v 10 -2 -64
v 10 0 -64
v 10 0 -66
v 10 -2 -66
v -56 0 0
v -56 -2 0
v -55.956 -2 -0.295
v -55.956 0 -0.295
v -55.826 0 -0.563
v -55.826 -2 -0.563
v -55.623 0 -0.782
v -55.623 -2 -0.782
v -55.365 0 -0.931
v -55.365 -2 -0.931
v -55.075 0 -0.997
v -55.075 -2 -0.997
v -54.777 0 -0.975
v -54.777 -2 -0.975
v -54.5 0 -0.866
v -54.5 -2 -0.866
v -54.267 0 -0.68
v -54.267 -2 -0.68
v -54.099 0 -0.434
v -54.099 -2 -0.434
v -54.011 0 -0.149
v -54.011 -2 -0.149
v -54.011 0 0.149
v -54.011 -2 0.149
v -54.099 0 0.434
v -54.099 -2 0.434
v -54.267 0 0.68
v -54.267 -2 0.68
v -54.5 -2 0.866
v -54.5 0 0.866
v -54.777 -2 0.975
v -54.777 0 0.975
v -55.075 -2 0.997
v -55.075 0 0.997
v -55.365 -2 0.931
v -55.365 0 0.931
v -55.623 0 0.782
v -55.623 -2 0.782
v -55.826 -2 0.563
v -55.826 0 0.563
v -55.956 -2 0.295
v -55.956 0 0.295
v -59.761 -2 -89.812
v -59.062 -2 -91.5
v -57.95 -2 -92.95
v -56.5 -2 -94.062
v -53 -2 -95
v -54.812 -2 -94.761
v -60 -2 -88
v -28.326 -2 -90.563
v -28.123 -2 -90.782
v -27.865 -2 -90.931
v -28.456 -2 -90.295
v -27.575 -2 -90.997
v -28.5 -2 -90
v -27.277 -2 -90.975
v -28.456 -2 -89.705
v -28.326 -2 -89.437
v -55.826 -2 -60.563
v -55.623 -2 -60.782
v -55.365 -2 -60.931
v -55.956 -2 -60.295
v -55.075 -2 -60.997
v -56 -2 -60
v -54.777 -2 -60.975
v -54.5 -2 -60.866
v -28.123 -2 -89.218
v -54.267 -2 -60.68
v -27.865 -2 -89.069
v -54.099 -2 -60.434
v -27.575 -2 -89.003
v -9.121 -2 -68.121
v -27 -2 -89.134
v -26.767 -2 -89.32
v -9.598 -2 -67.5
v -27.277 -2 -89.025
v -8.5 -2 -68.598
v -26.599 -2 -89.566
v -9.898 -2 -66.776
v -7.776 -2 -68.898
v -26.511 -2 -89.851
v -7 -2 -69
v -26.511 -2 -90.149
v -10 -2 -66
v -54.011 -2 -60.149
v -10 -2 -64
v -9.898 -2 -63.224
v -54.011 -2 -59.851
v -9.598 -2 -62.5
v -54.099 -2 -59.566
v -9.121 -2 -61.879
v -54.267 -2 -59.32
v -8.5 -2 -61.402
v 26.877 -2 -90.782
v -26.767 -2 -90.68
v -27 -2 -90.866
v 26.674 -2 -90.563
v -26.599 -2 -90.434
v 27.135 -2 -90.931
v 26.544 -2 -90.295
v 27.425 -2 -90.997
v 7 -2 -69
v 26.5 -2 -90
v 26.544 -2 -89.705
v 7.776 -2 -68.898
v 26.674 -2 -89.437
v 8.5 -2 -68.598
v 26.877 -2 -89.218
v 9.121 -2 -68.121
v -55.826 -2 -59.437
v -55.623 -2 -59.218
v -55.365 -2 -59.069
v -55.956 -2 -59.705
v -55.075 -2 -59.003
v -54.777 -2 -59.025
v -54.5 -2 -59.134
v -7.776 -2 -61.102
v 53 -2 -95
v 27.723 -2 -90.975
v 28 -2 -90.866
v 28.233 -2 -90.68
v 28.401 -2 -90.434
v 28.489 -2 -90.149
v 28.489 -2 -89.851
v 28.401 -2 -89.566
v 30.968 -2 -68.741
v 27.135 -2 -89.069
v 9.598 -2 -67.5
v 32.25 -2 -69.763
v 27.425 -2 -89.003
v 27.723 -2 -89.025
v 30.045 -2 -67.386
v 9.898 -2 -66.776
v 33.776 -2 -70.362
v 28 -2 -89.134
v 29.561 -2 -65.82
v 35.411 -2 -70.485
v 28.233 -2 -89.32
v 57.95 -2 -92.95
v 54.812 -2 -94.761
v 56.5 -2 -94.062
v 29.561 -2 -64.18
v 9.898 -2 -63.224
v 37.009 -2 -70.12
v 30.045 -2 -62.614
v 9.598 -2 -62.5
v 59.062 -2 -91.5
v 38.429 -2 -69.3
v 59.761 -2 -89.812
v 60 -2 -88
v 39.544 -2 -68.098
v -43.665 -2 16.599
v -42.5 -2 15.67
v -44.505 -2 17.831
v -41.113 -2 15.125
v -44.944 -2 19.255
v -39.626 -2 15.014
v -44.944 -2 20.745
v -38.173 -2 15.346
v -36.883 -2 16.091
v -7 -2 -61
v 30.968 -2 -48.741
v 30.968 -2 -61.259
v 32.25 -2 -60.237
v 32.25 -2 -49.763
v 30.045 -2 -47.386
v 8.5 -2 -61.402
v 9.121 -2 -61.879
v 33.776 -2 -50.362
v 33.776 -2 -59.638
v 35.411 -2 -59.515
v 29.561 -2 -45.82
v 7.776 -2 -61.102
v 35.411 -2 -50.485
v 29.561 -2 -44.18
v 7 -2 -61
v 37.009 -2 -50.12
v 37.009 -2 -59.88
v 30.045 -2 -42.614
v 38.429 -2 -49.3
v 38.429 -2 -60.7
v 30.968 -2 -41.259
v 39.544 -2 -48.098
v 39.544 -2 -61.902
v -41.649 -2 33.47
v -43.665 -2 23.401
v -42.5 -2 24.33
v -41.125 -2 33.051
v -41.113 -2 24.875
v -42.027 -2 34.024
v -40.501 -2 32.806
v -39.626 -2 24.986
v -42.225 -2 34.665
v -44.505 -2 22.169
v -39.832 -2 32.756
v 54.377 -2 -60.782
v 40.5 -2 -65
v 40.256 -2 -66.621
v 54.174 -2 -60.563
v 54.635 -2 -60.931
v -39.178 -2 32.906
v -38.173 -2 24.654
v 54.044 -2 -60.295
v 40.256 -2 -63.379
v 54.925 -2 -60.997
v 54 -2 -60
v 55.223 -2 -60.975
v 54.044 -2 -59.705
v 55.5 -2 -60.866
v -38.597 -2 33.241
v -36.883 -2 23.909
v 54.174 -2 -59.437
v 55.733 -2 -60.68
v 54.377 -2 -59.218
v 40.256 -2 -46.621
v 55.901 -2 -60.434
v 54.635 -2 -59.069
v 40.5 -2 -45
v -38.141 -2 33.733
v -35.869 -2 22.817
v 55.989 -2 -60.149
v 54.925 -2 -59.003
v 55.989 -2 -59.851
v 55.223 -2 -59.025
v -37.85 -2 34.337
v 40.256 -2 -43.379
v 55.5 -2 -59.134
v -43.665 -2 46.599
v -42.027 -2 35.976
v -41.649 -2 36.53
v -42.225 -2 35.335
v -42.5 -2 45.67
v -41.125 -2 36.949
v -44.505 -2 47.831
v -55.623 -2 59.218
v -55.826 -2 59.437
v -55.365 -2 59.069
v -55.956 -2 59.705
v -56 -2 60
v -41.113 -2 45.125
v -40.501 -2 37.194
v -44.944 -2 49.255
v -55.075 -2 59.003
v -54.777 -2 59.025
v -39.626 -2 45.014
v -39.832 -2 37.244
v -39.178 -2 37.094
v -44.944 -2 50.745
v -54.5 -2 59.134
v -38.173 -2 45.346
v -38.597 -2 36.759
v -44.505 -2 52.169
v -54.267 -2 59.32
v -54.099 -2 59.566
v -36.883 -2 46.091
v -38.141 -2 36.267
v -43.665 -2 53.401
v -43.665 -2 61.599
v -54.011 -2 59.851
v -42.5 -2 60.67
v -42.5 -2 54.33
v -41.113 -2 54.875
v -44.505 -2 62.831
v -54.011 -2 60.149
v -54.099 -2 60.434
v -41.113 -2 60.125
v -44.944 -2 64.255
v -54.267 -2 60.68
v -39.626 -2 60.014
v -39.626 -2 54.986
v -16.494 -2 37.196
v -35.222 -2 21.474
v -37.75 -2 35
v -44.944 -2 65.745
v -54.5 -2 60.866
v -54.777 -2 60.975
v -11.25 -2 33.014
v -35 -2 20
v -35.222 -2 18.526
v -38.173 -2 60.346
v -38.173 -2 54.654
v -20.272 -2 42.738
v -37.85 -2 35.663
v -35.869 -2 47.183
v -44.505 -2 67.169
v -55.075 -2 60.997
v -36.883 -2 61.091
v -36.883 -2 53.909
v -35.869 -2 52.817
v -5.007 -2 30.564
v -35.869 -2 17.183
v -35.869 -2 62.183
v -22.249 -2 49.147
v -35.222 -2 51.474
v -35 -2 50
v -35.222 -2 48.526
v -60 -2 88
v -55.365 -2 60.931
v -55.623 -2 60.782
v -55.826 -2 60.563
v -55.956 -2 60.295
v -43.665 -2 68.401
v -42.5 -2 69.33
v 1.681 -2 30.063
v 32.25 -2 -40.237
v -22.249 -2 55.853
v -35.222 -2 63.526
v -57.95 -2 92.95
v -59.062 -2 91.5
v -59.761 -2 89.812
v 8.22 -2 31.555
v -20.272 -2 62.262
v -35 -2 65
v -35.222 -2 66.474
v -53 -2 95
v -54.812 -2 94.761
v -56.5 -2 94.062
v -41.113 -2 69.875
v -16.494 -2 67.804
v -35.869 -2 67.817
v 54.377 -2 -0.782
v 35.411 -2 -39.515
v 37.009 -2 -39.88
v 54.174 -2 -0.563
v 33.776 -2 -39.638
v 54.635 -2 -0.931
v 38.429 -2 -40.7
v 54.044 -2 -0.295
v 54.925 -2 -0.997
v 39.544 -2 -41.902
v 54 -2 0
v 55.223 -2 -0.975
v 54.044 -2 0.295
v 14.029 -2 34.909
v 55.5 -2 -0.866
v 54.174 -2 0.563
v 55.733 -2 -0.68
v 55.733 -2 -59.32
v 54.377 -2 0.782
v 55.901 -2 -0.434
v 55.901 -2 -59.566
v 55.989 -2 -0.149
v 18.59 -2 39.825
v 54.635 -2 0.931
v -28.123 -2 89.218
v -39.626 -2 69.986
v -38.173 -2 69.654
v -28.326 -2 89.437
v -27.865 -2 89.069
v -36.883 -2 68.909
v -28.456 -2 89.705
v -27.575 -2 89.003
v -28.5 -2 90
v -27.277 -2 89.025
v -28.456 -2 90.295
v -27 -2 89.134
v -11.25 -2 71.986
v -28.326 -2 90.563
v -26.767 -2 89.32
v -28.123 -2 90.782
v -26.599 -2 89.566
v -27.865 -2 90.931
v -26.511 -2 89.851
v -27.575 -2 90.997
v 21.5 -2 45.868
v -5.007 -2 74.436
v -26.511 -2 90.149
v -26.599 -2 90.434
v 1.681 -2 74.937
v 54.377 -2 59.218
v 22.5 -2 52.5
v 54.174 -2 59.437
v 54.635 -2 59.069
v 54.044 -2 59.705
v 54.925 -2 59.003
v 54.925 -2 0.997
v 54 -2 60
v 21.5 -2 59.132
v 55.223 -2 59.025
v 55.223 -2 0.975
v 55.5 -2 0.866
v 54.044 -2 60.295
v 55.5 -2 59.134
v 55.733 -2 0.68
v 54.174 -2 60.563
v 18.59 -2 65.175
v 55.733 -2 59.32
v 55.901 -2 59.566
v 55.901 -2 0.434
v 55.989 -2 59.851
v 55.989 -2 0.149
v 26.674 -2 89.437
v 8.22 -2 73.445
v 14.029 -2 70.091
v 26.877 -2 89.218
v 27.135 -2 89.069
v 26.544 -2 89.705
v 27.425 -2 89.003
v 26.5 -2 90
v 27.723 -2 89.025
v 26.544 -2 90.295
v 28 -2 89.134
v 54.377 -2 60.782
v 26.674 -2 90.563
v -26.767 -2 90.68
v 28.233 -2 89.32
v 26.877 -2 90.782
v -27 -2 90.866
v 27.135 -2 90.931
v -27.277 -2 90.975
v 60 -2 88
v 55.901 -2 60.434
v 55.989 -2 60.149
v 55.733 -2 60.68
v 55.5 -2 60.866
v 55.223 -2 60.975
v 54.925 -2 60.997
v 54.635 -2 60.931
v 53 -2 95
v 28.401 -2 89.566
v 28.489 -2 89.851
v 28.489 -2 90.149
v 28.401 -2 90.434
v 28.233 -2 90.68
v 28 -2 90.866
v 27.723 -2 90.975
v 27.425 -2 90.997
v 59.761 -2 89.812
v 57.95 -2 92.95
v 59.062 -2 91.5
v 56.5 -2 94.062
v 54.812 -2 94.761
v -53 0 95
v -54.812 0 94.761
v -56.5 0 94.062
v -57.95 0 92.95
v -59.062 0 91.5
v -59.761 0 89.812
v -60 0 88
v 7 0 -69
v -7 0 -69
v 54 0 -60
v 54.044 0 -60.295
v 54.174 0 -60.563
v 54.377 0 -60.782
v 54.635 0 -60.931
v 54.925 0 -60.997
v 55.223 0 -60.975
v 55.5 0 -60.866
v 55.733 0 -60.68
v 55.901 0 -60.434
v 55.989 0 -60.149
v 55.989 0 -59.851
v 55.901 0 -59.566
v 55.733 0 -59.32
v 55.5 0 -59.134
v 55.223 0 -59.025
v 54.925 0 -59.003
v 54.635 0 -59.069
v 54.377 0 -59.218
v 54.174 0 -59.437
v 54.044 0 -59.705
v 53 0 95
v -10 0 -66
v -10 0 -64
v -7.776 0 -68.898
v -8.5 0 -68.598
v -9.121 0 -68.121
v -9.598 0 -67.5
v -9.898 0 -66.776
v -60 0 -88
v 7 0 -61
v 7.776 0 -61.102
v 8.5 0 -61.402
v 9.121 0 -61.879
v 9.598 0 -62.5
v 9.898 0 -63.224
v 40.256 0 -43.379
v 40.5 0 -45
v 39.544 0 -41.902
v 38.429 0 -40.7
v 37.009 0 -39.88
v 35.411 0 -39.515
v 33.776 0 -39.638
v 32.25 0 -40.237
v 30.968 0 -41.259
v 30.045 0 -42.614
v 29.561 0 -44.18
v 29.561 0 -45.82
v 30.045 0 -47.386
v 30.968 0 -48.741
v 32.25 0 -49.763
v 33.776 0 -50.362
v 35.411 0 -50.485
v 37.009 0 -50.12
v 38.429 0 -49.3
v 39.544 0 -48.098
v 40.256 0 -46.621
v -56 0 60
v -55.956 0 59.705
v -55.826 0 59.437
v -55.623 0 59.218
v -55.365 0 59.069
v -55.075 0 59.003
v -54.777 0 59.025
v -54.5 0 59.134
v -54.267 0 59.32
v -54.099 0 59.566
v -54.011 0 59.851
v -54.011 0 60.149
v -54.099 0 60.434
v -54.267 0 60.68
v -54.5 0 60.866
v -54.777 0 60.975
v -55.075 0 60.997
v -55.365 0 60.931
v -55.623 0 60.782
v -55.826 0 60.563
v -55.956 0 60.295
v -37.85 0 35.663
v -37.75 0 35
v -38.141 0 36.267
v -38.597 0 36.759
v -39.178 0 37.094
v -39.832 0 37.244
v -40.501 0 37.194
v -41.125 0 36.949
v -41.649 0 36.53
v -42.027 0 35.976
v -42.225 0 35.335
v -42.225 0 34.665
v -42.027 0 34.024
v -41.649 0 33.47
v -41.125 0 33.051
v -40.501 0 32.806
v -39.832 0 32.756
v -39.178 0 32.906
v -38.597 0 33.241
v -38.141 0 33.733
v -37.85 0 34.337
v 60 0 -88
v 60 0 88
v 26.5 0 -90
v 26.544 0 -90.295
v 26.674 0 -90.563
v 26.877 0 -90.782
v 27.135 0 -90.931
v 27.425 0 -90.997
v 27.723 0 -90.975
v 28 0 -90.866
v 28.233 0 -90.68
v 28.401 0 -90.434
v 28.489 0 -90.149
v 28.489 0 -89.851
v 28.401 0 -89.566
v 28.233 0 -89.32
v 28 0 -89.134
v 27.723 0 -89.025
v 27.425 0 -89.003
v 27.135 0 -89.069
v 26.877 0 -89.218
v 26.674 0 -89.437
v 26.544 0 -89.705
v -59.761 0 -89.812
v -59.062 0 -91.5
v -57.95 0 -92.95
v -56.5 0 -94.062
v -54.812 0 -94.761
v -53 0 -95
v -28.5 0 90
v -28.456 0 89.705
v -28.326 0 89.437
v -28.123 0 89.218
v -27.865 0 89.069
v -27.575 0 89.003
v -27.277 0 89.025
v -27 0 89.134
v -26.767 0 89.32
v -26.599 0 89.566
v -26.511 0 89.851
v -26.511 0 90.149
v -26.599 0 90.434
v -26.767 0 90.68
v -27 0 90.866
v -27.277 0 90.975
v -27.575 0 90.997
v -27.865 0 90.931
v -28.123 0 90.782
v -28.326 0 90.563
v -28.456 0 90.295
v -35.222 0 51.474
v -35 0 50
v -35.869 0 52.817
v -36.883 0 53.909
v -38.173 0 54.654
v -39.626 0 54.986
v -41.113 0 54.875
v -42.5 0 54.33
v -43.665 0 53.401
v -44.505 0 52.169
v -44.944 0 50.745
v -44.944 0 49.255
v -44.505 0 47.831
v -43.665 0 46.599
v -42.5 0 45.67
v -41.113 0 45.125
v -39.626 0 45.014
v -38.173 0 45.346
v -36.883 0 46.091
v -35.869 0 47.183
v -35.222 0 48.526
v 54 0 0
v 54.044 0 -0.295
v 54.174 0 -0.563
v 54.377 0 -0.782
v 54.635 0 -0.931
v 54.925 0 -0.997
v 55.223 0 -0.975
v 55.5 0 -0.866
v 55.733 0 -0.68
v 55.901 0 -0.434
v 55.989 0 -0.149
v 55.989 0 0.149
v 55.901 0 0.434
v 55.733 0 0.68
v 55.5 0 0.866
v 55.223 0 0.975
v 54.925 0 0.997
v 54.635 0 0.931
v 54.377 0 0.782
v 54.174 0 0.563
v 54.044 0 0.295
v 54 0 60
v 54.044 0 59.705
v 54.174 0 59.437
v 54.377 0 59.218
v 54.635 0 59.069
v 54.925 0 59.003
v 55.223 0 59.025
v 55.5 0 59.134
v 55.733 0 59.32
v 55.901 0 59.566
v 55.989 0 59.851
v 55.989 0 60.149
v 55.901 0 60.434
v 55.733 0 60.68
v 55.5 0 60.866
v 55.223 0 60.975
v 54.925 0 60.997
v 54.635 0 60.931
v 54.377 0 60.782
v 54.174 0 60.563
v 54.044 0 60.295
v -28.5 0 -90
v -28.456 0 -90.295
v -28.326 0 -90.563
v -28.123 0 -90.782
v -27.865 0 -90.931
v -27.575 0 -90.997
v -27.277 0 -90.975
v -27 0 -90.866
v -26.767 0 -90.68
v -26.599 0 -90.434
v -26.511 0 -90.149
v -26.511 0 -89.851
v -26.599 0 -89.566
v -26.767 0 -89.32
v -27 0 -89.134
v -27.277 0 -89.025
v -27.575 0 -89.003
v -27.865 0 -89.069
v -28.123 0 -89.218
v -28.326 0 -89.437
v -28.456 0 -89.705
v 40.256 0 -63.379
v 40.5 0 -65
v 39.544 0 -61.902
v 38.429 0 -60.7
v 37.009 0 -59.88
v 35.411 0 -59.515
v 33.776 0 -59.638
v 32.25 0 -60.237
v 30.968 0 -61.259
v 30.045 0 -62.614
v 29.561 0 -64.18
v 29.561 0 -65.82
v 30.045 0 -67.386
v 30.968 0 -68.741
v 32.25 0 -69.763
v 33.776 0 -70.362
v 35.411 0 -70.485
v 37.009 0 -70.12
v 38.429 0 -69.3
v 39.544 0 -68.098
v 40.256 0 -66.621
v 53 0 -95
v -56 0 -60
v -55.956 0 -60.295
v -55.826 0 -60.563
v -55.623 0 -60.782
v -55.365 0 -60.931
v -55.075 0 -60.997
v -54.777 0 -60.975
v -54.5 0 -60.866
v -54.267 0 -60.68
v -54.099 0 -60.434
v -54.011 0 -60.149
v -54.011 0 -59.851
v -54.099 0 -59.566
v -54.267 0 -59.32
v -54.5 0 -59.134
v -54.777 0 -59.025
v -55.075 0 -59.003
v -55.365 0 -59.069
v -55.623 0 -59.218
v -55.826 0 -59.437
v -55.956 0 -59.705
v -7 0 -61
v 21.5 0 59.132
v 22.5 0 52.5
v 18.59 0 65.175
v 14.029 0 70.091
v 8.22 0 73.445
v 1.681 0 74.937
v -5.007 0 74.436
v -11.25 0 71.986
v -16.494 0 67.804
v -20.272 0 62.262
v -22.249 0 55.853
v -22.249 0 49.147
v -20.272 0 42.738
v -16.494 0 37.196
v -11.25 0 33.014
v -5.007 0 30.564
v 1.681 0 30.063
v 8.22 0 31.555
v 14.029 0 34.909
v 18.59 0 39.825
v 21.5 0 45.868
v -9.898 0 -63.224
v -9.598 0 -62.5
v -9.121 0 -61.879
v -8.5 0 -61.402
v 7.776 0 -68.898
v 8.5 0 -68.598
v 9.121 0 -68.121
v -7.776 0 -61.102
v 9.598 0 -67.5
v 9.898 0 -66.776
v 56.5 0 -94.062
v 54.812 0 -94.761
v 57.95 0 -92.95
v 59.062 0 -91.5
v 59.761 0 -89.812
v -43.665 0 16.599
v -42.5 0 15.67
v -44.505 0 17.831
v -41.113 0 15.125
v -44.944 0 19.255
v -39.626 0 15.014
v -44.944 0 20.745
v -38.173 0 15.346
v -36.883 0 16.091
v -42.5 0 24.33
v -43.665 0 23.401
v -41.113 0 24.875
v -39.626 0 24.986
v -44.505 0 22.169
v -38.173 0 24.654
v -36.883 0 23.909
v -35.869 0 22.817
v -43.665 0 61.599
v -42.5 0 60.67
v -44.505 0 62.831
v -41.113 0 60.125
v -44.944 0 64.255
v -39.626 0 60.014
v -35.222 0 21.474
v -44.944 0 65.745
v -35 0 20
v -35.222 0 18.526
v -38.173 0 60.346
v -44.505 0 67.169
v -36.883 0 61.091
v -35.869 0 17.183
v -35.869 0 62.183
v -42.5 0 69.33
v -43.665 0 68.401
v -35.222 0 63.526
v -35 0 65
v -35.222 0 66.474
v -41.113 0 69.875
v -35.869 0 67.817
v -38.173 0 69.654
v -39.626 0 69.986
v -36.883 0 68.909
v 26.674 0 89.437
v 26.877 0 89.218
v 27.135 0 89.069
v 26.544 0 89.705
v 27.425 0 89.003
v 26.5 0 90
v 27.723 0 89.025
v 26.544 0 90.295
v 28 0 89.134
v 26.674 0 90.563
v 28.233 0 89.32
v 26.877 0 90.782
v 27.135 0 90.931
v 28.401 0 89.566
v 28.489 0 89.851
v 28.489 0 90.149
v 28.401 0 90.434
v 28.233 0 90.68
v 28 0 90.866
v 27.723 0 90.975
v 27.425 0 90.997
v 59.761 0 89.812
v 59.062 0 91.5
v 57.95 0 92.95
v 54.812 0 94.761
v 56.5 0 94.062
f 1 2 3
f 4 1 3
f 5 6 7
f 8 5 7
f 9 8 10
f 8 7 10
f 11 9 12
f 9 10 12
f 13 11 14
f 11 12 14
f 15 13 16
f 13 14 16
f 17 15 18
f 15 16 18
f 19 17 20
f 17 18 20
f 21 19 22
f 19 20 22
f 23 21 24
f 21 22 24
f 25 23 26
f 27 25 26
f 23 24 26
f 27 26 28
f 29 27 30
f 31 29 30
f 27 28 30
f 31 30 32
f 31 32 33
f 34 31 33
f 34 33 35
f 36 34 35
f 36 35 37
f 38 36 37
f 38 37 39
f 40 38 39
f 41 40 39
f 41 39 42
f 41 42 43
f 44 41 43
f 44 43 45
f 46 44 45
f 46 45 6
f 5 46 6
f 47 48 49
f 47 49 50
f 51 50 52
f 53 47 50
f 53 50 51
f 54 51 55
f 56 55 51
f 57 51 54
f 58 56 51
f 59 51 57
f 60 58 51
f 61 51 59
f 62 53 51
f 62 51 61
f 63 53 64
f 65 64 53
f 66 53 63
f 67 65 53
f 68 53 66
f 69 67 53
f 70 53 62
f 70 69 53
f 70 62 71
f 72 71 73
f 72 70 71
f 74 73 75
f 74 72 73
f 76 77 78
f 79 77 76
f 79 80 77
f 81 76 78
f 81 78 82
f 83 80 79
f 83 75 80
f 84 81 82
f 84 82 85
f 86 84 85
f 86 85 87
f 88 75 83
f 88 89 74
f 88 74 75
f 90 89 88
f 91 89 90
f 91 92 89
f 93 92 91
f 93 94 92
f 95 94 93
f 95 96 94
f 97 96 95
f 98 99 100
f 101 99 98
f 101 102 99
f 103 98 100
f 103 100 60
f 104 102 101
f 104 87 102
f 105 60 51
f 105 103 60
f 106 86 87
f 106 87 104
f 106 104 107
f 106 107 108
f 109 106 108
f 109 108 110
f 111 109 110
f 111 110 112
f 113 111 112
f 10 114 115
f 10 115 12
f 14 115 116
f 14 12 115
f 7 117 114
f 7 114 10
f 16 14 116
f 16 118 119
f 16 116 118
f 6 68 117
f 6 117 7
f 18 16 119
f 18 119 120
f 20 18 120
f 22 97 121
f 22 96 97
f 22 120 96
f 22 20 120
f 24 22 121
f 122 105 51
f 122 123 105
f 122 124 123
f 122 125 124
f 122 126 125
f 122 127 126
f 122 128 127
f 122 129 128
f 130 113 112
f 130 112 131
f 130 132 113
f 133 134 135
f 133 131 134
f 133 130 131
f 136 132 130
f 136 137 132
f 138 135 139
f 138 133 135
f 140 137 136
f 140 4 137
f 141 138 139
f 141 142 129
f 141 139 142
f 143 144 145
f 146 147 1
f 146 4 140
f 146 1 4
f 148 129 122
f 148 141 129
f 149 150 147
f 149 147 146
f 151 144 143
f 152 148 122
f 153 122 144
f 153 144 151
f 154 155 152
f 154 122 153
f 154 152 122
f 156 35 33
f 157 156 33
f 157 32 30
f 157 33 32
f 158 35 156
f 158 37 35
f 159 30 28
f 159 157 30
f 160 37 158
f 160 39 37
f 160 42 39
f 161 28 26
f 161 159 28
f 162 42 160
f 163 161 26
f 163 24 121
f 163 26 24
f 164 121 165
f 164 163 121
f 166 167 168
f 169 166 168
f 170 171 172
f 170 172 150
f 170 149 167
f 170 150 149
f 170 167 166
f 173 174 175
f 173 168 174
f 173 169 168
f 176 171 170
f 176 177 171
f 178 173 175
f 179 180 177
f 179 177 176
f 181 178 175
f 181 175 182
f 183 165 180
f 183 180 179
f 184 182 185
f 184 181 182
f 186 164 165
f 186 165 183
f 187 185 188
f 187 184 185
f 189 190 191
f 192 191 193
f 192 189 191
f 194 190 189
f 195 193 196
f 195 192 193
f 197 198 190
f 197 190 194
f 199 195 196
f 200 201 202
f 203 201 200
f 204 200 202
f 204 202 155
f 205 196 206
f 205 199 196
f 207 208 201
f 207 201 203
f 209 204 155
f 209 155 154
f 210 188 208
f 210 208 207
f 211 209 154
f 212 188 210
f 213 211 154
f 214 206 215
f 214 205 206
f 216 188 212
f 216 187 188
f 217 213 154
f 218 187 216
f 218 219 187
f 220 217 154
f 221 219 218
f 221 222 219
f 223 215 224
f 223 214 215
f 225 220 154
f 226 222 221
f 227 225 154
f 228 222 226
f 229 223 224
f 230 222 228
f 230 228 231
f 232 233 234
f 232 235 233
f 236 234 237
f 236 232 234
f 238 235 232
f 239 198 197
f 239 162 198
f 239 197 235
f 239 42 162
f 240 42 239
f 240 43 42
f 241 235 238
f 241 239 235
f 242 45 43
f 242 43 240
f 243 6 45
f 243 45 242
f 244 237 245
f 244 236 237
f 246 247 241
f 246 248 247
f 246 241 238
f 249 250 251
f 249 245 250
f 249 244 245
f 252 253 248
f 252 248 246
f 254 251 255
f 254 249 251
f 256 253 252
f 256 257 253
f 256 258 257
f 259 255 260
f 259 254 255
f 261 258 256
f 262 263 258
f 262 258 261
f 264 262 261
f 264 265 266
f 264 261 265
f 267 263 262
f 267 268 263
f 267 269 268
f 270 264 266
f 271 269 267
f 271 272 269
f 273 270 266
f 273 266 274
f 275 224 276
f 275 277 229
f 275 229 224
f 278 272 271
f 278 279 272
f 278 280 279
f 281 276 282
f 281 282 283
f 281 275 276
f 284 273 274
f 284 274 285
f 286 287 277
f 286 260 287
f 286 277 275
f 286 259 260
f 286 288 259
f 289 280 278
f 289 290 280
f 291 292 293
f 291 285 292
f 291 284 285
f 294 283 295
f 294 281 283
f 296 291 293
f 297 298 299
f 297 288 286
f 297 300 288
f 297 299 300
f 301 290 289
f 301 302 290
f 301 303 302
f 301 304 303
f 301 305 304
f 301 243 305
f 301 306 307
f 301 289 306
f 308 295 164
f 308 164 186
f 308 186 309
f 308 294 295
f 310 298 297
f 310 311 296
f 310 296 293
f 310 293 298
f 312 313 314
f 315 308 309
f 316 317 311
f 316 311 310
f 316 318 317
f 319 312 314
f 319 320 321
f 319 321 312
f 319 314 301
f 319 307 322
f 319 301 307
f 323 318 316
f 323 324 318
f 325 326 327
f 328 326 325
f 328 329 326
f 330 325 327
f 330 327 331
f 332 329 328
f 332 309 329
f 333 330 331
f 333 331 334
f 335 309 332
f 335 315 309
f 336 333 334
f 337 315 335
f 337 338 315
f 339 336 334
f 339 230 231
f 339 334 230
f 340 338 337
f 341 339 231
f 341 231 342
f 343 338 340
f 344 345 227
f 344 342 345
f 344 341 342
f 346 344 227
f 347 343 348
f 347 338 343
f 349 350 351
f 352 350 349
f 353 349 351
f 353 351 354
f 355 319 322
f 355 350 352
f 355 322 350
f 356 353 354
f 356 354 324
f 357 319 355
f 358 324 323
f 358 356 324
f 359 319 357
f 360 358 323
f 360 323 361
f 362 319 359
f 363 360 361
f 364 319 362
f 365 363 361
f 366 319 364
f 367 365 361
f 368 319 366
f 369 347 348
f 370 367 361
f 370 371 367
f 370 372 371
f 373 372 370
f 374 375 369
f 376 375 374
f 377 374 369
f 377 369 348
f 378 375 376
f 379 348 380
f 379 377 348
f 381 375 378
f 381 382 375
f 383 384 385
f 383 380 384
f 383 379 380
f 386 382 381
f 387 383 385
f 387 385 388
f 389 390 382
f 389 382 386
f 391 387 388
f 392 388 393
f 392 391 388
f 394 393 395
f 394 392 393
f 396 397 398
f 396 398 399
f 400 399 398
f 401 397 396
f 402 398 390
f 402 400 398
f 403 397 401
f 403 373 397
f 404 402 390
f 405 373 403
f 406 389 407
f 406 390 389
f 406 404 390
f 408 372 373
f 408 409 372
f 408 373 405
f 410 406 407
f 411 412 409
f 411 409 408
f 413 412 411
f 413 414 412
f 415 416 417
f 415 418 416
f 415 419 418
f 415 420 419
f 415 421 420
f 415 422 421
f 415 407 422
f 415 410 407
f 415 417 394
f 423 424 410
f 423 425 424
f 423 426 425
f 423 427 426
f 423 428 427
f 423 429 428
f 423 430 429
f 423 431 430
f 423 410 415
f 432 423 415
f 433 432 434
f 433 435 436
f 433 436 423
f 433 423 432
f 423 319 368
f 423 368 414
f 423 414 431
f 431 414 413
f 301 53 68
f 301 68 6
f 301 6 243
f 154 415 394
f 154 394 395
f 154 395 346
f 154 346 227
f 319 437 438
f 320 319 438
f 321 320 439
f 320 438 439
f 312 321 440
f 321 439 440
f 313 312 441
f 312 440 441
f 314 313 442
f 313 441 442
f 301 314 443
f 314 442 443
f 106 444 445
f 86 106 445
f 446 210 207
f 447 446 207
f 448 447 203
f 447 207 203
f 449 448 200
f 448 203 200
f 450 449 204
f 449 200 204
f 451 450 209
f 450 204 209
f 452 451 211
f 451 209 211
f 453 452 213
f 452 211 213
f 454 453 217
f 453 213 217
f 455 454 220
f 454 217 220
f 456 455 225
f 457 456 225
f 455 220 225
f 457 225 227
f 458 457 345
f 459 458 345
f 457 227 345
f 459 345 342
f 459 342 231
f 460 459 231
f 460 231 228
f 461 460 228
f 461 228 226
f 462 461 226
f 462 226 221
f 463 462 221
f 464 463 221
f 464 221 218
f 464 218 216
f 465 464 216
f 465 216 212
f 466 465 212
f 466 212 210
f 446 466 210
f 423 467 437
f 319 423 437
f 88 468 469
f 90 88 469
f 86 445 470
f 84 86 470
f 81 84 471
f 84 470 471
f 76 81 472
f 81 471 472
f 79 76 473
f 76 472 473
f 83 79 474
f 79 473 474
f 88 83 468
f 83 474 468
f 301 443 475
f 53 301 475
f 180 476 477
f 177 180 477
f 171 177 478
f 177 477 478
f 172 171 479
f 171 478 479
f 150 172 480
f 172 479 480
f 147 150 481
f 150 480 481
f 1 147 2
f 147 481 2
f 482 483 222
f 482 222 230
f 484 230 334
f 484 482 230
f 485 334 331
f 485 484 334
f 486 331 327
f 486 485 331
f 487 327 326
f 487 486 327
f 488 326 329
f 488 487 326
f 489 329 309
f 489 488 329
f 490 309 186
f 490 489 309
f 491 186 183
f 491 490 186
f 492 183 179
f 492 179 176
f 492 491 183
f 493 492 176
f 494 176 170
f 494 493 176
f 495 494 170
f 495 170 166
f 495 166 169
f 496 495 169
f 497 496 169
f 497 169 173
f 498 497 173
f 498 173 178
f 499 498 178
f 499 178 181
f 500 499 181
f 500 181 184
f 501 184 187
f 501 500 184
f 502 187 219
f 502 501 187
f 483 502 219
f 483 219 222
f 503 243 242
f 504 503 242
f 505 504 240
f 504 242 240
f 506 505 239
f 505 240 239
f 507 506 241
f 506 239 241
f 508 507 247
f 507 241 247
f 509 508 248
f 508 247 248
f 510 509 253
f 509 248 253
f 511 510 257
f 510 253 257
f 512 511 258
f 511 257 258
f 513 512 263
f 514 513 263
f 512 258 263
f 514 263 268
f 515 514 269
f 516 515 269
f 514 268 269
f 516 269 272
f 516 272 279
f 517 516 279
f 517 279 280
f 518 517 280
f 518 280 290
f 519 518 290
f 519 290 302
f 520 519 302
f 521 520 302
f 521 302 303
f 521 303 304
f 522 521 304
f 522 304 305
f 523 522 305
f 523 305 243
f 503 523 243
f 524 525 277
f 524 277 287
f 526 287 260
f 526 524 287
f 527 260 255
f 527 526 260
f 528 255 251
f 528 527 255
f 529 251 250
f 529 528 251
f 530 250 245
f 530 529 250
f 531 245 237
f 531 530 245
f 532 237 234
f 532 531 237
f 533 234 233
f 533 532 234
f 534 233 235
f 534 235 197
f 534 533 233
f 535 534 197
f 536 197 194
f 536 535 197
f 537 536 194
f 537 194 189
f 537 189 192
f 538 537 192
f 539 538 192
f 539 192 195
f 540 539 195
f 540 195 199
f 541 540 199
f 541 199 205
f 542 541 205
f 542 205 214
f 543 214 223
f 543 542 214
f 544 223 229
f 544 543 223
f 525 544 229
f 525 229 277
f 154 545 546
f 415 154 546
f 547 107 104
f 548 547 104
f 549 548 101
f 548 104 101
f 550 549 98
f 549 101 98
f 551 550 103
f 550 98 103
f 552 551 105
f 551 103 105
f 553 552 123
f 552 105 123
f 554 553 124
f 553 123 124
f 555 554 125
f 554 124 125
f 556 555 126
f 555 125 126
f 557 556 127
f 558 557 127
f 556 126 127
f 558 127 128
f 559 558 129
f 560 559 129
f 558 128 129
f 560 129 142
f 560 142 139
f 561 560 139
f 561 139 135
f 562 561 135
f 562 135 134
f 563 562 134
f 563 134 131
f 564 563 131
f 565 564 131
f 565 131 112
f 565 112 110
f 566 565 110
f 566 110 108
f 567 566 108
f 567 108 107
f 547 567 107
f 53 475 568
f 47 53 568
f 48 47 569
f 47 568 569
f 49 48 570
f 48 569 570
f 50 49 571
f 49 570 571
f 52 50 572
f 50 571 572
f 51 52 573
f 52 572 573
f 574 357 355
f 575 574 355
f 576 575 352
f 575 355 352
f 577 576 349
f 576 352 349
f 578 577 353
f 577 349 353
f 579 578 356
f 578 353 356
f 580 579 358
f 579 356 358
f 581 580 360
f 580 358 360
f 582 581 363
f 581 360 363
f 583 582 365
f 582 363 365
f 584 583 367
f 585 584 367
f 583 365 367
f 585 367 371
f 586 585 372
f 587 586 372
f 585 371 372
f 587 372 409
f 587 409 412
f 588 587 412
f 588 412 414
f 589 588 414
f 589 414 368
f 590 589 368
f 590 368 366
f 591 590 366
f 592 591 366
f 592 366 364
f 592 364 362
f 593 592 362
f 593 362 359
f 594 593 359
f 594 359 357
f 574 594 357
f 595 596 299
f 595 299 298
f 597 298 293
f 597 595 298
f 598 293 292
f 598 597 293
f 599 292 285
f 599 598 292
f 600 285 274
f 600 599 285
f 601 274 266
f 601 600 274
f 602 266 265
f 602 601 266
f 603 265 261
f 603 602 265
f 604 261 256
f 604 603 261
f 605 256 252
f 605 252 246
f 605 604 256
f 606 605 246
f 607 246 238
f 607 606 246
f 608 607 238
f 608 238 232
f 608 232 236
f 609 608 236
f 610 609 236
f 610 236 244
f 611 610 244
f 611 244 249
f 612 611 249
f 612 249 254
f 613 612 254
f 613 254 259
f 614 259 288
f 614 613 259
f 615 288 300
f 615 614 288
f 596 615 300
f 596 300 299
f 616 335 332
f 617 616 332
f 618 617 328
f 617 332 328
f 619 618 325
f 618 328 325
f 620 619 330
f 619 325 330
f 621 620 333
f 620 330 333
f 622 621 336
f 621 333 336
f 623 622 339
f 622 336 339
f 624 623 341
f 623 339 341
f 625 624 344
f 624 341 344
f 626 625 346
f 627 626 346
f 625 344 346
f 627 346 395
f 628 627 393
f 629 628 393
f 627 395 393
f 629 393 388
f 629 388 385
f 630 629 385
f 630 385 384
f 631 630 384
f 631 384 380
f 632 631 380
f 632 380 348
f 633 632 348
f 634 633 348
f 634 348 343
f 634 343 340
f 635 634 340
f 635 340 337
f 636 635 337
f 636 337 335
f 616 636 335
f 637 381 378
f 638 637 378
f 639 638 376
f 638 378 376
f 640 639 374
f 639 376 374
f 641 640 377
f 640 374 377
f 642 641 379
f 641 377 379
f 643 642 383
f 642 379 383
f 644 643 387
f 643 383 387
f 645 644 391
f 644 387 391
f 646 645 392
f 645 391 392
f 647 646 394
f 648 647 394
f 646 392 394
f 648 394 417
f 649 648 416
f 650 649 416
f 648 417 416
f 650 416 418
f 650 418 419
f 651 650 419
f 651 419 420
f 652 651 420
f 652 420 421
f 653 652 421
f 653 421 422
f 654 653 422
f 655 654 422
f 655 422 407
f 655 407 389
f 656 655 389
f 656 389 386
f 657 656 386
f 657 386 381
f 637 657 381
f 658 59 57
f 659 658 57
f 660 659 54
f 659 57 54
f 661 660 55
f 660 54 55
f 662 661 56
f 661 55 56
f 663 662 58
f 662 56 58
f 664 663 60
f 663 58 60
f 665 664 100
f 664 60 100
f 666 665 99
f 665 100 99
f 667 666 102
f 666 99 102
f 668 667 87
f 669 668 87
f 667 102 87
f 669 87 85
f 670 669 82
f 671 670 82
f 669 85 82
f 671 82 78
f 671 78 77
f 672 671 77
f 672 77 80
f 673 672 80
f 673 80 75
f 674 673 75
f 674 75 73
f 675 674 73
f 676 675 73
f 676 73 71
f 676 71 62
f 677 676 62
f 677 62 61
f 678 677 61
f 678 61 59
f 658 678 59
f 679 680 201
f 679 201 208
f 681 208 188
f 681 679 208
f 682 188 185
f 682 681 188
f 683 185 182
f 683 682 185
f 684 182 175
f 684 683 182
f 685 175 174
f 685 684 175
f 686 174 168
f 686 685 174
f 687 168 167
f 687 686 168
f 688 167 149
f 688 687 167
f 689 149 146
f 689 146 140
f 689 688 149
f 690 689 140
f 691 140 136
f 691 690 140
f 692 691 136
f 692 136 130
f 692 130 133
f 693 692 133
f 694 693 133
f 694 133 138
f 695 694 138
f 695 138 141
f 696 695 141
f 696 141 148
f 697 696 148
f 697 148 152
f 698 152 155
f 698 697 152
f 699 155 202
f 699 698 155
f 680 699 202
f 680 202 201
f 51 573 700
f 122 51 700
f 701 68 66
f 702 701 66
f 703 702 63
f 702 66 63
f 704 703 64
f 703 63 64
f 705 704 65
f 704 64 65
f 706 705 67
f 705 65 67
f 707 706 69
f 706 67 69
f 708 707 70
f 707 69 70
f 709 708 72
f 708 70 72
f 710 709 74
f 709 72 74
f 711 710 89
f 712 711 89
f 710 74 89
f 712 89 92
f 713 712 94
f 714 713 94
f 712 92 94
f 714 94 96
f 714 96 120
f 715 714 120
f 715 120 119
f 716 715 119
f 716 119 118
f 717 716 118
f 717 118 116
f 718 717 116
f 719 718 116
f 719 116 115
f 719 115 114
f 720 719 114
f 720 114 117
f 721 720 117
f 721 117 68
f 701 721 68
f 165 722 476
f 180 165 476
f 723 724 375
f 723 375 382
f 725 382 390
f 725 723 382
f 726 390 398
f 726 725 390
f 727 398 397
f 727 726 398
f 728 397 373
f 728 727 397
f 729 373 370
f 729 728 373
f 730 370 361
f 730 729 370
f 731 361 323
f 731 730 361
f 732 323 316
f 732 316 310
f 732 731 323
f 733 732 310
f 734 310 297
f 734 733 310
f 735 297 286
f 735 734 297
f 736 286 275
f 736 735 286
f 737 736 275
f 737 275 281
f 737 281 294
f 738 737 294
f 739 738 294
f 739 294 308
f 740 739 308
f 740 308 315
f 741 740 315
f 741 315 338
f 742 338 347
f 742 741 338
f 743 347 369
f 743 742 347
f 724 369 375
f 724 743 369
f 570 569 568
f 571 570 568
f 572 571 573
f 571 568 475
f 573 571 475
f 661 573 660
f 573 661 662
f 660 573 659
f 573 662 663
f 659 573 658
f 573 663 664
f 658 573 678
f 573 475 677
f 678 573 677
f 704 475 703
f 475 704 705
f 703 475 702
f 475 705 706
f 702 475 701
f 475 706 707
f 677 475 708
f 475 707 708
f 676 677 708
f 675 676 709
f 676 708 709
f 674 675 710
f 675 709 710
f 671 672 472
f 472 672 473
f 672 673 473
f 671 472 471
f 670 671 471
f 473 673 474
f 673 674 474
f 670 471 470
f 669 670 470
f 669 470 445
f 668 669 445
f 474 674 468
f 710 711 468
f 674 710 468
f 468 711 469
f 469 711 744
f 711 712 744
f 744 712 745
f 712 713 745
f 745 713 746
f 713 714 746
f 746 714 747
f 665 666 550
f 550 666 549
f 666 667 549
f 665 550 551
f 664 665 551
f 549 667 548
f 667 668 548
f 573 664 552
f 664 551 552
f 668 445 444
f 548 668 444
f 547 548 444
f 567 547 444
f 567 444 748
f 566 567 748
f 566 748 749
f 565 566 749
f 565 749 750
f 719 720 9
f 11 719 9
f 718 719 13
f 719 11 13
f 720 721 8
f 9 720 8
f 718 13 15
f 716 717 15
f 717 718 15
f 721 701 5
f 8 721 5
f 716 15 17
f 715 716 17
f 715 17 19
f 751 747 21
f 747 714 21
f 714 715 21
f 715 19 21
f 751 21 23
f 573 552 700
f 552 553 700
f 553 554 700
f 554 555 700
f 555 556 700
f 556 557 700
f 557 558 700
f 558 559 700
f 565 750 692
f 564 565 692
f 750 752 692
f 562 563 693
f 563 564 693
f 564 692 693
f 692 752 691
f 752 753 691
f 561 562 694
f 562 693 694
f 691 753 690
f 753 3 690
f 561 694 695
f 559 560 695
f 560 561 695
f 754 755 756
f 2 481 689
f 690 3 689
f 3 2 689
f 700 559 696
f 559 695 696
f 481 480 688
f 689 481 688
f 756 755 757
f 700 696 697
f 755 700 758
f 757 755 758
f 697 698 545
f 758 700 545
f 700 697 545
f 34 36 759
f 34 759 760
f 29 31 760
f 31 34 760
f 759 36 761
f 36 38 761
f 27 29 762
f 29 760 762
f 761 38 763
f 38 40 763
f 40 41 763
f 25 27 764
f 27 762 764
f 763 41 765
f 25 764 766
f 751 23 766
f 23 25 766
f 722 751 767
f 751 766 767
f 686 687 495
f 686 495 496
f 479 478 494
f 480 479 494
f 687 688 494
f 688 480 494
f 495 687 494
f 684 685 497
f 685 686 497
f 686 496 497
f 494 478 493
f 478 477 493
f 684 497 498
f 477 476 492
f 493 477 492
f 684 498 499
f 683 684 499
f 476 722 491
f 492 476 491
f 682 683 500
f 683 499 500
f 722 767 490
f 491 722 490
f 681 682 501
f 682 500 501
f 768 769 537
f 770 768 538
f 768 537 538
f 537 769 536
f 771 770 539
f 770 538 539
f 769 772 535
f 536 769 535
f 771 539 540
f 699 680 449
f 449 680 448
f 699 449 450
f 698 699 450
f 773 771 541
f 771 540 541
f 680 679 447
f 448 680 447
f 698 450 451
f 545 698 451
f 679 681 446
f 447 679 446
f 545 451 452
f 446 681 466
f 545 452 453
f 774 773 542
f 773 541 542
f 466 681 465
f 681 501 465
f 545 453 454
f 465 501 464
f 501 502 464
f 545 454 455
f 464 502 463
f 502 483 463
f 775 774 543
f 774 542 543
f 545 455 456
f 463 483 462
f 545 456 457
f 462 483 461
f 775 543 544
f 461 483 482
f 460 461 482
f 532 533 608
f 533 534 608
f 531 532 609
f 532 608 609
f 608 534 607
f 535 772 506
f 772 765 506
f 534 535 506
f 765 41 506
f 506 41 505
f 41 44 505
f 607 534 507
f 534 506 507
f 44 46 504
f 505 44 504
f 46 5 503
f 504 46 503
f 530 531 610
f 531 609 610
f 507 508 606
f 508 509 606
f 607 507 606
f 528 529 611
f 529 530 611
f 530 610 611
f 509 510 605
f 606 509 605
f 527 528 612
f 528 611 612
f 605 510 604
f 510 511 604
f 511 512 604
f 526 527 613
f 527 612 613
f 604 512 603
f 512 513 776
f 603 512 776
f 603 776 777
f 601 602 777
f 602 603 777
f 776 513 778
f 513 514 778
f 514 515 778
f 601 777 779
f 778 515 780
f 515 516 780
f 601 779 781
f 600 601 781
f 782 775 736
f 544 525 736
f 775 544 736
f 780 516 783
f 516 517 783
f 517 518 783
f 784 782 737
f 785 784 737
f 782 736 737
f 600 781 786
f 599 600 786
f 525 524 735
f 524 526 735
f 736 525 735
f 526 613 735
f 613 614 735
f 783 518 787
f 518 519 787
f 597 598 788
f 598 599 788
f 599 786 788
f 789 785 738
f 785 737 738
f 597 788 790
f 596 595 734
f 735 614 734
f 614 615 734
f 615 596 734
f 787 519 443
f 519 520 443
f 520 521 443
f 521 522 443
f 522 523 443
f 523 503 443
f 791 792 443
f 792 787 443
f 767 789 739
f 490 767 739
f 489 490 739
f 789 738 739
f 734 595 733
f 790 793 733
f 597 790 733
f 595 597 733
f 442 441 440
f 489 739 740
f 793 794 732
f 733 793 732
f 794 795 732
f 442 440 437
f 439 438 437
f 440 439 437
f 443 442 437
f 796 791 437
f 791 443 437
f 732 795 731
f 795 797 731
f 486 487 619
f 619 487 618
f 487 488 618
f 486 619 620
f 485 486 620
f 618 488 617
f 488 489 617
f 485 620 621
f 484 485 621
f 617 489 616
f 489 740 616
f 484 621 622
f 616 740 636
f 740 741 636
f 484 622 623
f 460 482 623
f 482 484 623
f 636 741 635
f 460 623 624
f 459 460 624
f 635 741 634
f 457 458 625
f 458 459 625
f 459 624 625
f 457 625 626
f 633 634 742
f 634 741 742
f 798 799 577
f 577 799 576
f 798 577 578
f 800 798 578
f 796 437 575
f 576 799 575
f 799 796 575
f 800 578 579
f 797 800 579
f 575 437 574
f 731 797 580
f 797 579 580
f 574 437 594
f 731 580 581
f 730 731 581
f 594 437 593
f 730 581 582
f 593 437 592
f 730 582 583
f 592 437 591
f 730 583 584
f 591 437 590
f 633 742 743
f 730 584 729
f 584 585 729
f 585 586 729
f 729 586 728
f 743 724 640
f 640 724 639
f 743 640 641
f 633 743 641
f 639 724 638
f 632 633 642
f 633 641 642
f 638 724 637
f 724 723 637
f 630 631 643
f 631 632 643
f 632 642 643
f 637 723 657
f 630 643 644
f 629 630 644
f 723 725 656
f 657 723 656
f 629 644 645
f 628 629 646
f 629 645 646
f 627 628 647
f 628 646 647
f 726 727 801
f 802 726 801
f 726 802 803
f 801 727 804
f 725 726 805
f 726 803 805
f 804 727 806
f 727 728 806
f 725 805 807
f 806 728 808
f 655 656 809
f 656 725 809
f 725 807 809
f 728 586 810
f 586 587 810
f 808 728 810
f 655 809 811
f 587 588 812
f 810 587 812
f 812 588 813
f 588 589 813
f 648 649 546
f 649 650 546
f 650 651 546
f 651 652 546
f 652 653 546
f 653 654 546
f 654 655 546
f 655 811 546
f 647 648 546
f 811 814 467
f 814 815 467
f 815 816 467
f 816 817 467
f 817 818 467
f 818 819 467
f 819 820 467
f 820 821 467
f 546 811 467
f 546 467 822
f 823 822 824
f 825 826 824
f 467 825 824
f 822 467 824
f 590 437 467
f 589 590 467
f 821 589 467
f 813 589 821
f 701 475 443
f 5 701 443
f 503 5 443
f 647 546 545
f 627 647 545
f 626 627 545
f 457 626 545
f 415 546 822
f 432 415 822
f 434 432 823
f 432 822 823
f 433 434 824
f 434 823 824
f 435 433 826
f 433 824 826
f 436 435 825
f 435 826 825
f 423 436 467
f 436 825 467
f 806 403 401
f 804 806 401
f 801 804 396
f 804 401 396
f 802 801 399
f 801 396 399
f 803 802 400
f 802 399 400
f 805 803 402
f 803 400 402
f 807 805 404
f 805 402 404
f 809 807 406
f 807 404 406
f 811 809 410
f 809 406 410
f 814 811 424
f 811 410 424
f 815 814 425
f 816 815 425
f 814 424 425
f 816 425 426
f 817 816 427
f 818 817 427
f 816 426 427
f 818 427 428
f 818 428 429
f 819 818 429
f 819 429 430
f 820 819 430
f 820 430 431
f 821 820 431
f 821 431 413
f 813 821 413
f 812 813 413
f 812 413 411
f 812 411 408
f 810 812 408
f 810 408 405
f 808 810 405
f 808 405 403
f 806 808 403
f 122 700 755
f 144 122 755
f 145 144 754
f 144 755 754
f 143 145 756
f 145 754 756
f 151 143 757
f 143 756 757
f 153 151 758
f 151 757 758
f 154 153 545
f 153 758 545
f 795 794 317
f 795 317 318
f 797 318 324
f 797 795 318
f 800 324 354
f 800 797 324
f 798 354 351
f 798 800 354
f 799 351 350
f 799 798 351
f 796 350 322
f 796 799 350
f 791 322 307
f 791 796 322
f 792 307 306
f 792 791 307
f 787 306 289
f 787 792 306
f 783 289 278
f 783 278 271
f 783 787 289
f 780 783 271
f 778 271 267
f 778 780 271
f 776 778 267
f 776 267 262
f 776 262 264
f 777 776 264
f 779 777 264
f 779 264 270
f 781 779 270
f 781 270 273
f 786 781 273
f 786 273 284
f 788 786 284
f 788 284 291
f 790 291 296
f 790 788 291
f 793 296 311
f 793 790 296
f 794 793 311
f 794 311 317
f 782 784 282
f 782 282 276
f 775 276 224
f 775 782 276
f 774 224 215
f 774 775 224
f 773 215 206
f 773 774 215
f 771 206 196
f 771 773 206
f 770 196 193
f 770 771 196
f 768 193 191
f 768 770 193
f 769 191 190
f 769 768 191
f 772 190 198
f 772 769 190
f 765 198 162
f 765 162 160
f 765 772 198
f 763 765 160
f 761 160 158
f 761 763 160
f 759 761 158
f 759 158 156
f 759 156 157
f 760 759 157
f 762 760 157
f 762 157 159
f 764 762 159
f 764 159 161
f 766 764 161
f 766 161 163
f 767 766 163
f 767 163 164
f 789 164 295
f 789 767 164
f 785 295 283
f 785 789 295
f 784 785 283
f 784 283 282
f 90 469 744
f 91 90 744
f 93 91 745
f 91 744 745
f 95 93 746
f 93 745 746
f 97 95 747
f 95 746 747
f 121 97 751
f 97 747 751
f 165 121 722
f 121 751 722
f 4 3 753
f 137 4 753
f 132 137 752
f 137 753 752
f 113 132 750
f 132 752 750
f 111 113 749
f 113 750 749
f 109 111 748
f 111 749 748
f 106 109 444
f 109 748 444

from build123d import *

# Parameters (mm, degrees)
F0_R     = 5.5
F0_R_2   = 5
F0_R_3   = 2.25
F0_R_4   = 22.5
F1_DEPTH = 2
F2_D     = 2


with BuildPart() as f1:
    # F0 (on Front) → F1 (new body)
    with BuildSketch(Plane.XZ):
        with BuildLine():
            ThreePointArc((60, 88), (57.949747, 92.949747), (53, 95))
            Line((53, 95), (-53, 95))
            ThreePointArc((-53, 95), (-57.949747, 92.949747), (-60, 88))
            Line((-60, 88), (-60, -88))
            ThreePointArc((-60, -88), (-57.949747, -92.949747), (-53, -95))
            Line((-53, -95), (53, -95))
            ThreePointArc((53, -95), (57.949747, -92.949747), (60, -88))
            Line((60, -88), (60, 88))
        make_face()
        with BuildLine():
            ThreePointArc((10, -66), (9.12132, -68.12132), (7, -69))
            Line((7, -69), (-7, -69))
            ThreePointArc((-7, -69), (-9.12132, -68.12132), (-10, -66))
            Line((-10, -66), (-10, -64))
            ThreePointArc((-10, -64), (-9.12132, -61.87868), (-7, -61))
            Line((-7, -61), (7, -61))
            ThreePointArc((7, -61), (9.12132, -61.87868), (10, -64))
            Line((10, -64), (10, -66))
        make_face(mode=Mode.SUBTRACT)
        with Locations((35, -65)):
            Circle(F0_R, mode=Mode.SUBTRACT)
        with Locations((35, -45)):
            Circle(F0_R, mode=Mode.SUBTRACT)
        with Locations((-40, 20)):
            Circle(F0_R_2, mode=Mode.SUBTRACT)
        with Locations((-40, 35)):
            Circle(F0_R_3, mode=Mode.SUBTRACT)
        with Locations((-40, 50)):
            Circle(F0_R_2, mode=Mode.SUBTRACT)
        with Locations((-40, 65)):
            Circle(F0_R_2, mode=Mode.SUBTRACT)
        with Locations((0, 52.5)):
            Circle(F0_R_4, mode=Mode.SUBTRACT)
    extrude(amount=F1_DEPTH)

    # F2 (through all)
    with Locations(Plane(origin=(0, 0, 0), x_dir=(1, 0, 0), z_dir=(0, 1, 0))):
        with Locations((-27.5, 90), (-55, 60), (-55, 0), (-55, -60), (-27.5, -90), (27.5, -90), (55, -60), (55, 0), (55, 60), (27.5, 90)):
            Hole(F2_D / 2)


solid = f1.part
